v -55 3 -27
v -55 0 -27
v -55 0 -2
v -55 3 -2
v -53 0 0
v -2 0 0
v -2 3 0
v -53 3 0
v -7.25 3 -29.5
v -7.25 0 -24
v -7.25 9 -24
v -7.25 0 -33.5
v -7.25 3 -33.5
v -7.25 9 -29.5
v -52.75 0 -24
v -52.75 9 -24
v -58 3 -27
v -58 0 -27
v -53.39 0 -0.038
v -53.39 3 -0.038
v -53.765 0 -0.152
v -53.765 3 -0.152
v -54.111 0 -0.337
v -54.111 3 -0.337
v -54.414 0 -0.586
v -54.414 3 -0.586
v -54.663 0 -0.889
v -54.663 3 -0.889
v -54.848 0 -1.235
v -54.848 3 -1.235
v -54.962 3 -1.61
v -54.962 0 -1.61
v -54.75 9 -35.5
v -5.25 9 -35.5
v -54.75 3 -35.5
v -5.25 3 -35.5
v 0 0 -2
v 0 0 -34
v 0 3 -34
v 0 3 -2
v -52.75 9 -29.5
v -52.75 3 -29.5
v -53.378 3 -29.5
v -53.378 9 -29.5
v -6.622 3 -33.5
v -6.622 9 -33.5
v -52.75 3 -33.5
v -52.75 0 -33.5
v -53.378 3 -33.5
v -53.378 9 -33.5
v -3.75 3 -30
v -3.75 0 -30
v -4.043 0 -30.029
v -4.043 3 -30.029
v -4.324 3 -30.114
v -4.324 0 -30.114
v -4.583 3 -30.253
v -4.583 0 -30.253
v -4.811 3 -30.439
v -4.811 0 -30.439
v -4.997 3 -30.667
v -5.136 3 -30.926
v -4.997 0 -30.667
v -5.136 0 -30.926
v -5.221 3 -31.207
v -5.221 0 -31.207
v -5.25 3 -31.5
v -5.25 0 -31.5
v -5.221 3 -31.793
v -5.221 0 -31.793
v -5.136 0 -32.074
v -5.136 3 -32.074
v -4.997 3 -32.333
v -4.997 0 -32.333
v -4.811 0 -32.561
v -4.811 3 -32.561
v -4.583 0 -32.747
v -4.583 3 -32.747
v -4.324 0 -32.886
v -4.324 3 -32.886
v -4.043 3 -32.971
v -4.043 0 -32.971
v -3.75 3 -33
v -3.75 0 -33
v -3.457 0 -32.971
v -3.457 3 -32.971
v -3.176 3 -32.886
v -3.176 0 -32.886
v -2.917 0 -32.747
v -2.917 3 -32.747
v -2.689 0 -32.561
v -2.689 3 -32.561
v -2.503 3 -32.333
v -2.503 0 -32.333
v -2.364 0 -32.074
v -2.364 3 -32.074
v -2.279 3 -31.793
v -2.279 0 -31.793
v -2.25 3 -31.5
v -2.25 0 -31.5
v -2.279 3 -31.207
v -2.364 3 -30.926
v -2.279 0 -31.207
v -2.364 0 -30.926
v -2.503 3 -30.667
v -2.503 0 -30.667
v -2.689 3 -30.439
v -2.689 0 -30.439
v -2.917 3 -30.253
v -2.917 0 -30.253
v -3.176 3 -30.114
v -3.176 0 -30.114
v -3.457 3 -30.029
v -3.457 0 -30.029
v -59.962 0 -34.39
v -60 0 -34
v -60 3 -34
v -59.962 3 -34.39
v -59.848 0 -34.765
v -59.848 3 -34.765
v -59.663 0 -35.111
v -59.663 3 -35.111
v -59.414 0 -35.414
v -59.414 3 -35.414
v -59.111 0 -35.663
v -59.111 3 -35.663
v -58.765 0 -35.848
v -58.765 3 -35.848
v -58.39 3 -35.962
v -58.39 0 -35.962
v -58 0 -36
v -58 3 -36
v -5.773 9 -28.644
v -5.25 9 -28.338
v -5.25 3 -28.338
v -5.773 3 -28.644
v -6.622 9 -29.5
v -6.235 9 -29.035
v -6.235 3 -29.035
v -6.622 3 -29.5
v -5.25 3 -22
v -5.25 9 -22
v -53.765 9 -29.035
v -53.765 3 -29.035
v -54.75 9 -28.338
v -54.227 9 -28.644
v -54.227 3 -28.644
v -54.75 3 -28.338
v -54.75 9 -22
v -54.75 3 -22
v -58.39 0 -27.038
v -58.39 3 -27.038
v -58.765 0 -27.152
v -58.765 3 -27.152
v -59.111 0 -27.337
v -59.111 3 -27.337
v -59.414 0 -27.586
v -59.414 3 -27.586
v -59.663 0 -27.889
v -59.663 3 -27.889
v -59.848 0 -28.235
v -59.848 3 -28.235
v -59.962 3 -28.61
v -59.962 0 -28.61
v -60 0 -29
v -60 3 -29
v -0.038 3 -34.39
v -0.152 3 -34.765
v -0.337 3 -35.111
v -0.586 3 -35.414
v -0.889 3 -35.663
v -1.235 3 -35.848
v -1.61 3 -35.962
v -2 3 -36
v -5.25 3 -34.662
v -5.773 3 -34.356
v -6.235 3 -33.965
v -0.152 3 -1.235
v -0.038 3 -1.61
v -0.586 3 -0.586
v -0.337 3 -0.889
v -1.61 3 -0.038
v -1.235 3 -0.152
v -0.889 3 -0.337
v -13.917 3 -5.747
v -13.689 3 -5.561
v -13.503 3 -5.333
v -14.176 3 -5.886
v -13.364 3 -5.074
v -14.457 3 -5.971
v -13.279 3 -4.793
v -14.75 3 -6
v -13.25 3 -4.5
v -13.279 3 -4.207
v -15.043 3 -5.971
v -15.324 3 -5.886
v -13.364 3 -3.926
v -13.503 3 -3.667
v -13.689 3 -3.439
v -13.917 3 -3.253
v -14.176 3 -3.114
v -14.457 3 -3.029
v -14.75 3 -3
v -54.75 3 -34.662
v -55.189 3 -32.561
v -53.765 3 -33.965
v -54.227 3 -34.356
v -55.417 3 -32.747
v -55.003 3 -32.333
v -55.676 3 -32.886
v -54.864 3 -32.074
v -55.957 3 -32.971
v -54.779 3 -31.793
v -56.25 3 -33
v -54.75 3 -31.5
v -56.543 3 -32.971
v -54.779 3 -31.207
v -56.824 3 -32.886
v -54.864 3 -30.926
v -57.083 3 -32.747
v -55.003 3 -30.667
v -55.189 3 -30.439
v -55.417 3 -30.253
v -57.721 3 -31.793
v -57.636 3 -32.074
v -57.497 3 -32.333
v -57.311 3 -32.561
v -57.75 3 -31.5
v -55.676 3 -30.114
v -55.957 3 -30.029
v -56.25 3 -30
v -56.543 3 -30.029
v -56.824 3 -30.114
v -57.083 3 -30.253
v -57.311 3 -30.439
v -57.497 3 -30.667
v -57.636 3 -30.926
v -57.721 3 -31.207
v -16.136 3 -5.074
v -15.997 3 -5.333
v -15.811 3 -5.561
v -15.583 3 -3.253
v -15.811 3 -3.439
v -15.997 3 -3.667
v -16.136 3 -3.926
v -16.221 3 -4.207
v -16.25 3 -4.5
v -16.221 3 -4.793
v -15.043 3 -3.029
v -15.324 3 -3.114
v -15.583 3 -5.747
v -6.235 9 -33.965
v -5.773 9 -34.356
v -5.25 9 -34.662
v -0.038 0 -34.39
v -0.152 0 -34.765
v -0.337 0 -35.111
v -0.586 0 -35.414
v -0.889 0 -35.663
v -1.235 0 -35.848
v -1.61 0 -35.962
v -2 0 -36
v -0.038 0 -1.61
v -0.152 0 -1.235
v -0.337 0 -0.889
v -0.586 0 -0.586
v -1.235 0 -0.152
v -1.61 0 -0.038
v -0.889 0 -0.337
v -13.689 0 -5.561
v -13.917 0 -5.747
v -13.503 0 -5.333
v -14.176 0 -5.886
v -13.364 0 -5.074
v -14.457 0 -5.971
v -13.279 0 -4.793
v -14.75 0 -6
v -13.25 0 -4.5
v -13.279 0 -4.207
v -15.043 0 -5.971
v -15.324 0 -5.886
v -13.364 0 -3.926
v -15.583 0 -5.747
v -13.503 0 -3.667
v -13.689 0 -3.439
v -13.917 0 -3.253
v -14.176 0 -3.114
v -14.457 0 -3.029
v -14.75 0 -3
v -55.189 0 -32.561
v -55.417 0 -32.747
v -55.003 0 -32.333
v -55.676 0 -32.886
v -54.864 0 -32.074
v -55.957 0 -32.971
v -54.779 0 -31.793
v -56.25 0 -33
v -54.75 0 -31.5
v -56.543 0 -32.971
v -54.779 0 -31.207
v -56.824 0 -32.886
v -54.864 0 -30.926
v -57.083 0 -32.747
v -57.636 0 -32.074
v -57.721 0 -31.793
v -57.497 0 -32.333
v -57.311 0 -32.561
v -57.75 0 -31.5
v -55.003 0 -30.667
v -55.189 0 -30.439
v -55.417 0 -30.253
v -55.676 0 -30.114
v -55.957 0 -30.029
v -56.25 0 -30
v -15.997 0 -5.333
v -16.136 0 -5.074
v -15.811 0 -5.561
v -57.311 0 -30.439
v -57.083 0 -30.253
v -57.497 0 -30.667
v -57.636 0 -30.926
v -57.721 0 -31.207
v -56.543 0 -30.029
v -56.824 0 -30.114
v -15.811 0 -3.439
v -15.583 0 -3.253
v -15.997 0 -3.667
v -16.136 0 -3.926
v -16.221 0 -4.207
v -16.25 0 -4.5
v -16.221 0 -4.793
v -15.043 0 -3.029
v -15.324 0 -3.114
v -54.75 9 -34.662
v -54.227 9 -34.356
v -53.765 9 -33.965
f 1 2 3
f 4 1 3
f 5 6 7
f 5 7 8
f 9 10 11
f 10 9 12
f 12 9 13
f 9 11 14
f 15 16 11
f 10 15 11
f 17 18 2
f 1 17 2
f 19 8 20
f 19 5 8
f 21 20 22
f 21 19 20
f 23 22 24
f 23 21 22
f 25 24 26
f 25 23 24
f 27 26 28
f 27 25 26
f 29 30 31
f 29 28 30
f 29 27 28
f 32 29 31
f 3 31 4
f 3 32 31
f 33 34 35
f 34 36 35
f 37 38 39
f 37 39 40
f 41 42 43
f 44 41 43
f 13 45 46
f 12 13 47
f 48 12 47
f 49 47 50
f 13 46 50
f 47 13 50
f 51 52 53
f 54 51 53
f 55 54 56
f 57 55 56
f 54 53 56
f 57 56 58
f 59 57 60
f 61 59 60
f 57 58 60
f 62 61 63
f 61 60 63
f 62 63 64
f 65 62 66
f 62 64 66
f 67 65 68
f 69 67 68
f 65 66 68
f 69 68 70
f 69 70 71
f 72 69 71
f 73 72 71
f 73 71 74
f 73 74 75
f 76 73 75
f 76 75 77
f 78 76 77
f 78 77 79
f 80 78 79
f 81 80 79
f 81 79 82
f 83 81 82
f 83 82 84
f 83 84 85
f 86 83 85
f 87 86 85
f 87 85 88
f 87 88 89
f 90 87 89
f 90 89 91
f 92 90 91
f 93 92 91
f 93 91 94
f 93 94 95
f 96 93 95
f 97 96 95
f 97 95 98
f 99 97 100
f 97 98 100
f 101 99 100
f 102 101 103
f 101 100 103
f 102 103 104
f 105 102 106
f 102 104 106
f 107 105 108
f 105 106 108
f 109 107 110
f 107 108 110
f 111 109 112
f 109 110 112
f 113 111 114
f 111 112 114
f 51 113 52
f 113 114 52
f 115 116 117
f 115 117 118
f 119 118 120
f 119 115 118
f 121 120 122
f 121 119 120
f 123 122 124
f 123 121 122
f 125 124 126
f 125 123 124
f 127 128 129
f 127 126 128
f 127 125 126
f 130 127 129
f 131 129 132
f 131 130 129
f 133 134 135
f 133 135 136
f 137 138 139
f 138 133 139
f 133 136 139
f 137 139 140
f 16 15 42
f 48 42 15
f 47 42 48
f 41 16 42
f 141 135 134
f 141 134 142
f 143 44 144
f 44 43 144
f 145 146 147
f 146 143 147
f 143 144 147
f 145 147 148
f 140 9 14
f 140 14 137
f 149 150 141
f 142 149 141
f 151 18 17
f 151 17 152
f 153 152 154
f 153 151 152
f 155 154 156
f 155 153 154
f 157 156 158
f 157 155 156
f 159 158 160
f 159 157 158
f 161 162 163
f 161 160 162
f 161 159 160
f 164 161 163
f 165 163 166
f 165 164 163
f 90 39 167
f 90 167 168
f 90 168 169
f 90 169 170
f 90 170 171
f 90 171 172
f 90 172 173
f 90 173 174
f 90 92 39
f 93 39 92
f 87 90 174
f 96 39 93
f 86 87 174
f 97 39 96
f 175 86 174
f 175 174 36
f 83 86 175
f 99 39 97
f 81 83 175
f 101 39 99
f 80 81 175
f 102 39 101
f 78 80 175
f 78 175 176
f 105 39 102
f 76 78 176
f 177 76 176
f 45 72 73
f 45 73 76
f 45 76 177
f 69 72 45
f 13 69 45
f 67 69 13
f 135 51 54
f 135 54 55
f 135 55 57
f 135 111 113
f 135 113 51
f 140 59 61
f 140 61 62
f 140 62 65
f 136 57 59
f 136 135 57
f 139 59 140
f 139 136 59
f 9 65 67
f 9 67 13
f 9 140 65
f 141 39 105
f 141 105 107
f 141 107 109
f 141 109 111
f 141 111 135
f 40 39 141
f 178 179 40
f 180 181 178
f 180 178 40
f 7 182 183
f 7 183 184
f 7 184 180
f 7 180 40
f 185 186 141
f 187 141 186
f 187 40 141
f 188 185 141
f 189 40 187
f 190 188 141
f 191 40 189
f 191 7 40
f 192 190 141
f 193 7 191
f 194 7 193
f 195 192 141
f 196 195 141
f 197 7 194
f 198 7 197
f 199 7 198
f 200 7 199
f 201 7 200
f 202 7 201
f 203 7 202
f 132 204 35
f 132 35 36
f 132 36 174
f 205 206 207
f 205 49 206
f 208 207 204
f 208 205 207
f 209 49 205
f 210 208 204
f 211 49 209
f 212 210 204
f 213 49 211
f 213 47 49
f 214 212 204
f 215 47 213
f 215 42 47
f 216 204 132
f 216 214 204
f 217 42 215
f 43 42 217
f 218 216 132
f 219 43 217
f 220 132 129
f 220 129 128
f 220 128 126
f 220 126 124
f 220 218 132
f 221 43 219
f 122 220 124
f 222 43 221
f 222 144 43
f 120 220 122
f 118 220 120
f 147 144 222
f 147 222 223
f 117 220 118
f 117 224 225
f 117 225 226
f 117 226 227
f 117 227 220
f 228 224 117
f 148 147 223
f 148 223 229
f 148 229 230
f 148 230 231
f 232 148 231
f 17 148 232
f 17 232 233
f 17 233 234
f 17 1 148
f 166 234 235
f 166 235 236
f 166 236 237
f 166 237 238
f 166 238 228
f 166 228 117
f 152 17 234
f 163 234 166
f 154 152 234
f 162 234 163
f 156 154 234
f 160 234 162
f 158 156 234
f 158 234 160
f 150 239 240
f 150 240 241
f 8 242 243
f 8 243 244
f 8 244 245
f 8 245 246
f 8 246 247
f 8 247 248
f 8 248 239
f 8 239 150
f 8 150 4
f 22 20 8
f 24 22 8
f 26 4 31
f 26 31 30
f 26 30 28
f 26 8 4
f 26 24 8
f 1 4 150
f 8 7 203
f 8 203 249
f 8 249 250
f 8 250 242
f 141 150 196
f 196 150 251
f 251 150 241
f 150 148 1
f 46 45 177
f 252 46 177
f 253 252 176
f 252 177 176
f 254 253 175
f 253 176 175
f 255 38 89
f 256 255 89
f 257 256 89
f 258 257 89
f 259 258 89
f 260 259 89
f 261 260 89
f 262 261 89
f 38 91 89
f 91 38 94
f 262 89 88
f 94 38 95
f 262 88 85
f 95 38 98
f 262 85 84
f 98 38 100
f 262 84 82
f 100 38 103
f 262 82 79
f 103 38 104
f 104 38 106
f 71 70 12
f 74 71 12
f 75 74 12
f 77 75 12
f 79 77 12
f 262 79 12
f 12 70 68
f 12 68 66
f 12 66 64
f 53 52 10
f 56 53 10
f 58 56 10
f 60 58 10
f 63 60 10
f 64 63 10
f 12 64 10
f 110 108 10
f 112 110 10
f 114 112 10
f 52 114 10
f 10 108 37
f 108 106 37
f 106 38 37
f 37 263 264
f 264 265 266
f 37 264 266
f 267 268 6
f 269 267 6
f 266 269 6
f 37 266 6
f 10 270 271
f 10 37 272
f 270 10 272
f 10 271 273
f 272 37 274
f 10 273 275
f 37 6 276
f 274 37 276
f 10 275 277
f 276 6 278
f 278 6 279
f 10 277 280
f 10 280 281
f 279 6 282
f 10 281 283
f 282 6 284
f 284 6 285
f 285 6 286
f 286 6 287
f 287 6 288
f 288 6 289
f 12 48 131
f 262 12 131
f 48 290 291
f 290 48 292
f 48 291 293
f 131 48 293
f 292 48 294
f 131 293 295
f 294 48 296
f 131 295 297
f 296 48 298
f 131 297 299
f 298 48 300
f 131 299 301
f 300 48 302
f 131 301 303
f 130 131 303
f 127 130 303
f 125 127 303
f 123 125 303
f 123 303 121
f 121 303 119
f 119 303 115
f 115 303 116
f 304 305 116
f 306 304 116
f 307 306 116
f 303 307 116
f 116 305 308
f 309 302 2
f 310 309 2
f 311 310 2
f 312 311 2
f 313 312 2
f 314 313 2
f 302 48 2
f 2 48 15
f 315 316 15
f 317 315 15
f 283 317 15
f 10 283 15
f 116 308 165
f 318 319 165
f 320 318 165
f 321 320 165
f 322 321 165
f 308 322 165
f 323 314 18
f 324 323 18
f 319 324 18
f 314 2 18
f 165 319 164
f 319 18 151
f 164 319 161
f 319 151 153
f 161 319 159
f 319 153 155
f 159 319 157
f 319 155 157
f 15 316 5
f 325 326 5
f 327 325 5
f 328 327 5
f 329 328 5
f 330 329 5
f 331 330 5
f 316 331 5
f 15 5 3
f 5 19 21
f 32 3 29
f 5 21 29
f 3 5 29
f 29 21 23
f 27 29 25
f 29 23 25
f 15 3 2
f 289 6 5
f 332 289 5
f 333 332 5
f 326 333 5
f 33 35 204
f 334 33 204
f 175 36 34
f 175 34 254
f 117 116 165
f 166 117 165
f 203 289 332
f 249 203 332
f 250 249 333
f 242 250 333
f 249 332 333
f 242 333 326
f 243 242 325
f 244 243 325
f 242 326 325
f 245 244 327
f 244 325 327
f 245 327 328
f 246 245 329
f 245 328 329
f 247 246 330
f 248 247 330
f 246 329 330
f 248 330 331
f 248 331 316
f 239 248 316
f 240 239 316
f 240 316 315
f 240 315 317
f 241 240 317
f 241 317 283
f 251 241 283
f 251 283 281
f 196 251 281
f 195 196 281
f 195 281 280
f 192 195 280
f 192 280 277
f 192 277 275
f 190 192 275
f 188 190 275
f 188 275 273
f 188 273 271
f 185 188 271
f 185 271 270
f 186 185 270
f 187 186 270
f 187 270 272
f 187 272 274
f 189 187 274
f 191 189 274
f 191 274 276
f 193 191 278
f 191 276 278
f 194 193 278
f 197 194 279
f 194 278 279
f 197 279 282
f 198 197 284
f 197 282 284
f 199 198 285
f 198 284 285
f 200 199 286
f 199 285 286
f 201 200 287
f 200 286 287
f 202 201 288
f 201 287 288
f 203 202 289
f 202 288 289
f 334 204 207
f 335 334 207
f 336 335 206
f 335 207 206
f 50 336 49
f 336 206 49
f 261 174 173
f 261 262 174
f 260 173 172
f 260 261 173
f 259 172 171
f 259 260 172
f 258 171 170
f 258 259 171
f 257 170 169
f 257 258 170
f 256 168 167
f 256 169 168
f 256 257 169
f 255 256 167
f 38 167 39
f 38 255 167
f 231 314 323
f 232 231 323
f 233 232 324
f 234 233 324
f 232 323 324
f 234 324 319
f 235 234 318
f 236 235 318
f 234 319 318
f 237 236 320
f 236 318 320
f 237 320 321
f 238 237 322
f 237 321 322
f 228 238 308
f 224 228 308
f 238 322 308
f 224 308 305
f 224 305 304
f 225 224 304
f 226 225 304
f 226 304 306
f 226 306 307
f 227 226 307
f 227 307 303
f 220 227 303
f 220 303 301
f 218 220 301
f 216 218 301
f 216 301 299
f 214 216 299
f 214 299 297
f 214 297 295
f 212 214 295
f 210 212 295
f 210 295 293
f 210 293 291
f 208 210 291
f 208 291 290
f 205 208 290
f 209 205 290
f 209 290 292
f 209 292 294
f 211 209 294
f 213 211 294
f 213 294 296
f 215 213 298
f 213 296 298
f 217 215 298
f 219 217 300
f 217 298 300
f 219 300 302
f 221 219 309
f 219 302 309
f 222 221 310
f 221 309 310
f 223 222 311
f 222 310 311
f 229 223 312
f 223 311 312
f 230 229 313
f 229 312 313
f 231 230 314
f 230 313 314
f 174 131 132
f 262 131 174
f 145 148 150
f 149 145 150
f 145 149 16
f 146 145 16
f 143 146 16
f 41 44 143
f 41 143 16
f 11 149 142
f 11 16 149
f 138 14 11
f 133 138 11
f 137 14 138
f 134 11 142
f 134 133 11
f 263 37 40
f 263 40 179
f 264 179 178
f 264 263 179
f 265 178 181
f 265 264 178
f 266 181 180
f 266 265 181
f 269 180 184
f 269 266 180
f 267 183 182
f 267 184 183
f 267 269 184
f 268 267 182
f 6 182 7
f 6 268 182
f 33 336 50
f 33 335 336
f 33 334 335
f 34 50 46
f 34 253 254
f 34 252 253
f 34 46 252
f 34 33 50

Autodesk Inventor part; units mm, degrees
ref_plane "YZ Plane" through (0, 0, 0) normal (1, 0, 0) x (0, 1, 0)
ref_plane "XZ Plane" through (0, 0, 0) normal (0, 1, 0) x (-1, 0, 0)
ref_plane "XY Plane" through (0, 0, 0) normal (0, 0, 1) x (1, 0, 0)
sketch "Sketch1" plane through (0, 0, 0) normal (0, 1, 0) x (-1, 0, 0)
  line L0 (2, 0) -> (53, 0)
  line L1 (58, -36) -> (2, -36)
  line L2 (0, -34) -> (0, -2)
  line L3 (60, -34) -> (60, -29)
  line L4 (58, -27) -> (55, -27)
  line L5 (55, -27) -> (55, -2)
  arc A0 (58, -36) -> (60, -34) centre (58, -34) ccw
  arc A1 (0, -34) -> (2, -36) centre (2, -34) ccw
  arc A2 (55, -2) -> (53, 0) centre (53, -2) ccw
  arc A3 (2, 0) -> (0, -2) centre (2, -2) ccw
  arc A4 (60, -29) -> (58, -27) centre (58, -29) ccw
  point P0 (0, 0)
  point P1 (60, -36)
  point P2 (55, 0)
  point P3 (0, -36)
  point P4 (60, -27)
  dimension "d0" = 60
  dimension "d47" = 36
  dimension "d48" = 9
  dimension "d49" = 5
  dimension "d68" = 2
  dimension "d87" = 2
extrude "Extrusion1" add sketch "Sketch1" along normal blind 3
sketch "Sketch7" plane through (0, 3, 0) normal (0, 1, 0) x (1, 0, 0)
  line L0 (-53, 0) -> (-2, 0) projected
  line L1 (0, 2) -> (0, 34) projected
  line L2 (-2, 36) -> (-58, 36) projected
  line L3 (-56.25, 31.5) -> (-3.75, 31.5)
  line L4 (-3.75, 31.5) -> (-3.75, 4.5)
  line L5 (-3.75, 4.5) -> (-56.25, 4.5)
  line L6 (-56.25, 4.5) -> (-56.25, 31.5)
  line L7 (-55, 27) -> (-55, 2) projected
  line L8 (-60, 34) -> (-60, 29) projected
  line L9 (-58, 27) -> (-55, 27) projected
  arc A0 (-55, 2) -> (-53, 0) centre (-53, 2) ccw projected
  arc A1 (-2, 0) -> (0, 2) centre (-2, 2) ccw projected
  arc A2 (0, 34) -> (-2, 36) centre (-2, 34) ccw projected
  arc A3 (-58, 36) -> (-60, 34) centre (-58, 34) ccw projected
  arc A4 (-60, 29) -> (-58, 27) centre (-58, 29) ccw projected
  point P0 (-14.75, 4.5)
  dimension "d42" = 27
  dimension "d43" = 52.5
  dimension "d44" = 4.5
  dimension "d45" = 11
  dimension "d50" = 3.75
hole "Hole1" at (-56.25, 3, -31.5) at (-3.75, 3, -31.5) at (-14.75, 3, -4.5) direction (0, -1, 0) diameter 3 depth 10.25
sketch "Sketch8" plane through (0, 3, 0) normal (0, 1, 0) x (1, 0, 0)
  line L0 (-52.75, 33.5) -> (-7.25, 33.5)
  line L1 (-7.25, 24) -> (-52.75, 24)
  circle A0 centre (-56.25, 31.5) radius 1.5 projected
  circle A1 centre (-3.75, 31.5) radius 1.5 projected
  circle A2 centre (-56.25, 31.5) radius 3.5
  circle A3 centre (-3.75, 31.5) radius 3.5
  line L2 (-2, 36) -> (-58, 36) projected
  line L3 (-54.75, 28.3377) -> (-54.75, 22)
  line L4 (-54.75, 22) -> (-5.25, 22)
  line L5 (-5.25, 35.5) -> (-54.75, 35.5)
  line L6 (-54.75, 35.5) -> (-54.75, 34.6623)
  line L7 (-52.75, 33.5) -> (-53.3777, 33.5)
  line L8 (-52.75, 24) -> (-52.75, 29.5)
  line L9 (-52.75, 29.5) -> (-52.75, 31.5)
  line L10 (-52.75, 33.5) -> (-52.75, 31.5)
  line L11 (-52.75, 29.5) -> (-53.3777, 29.5)
  line L12 (-7.25, 33.5) -> (-7.25, 31.5)
  line L13 (-7.25, 31.5) -> (-7.25, 29.5)
  line L14 (-7.25, 29.5) -> (-7.25, 24)
  line L15 (-7.25, 33.5) -> (-6.6223, 33.5)
  line L16 (-7.25, 29.5) -> (-6.6223, 29.5)
  line L17 (-5.25, 35.5) -> (-5.25, 34.6623)
  line L18 (-5.25, 28.3377) -> (-5.25, 22)
  point P0 (0, 0)
  dimension "d73" = 9.5
  dimension "d74" = 45.5
  dimension "d75" = 7
  dimension "d76" = 7
  dimension "d77" = 2.5
  dimension "d78" = 2
  dimension "d81" = 2
  dimension "d82" = 9.5
  dimension "d83" = 2
  dimension "d85" = 49.5
  dimension "d86" = 49.5
extrude "Extrusion6" add sketch "Sketch8" along normal blind 6 contours L7 A2 L6 L5 L17 A3 L15 L0 | L11 L8 L1 L14 L16 A3 L18 L4 L3 A2
sketch "Sketch9" plane through (0, 3, 0) normal (0, 1, 0) x (1, 0, 0)
  line L0 (-52.75, 29.5) -> (-52.75, 24) projected
  line L1 (-52.75, 24) -> (-7.25, 24) projected
  line L2 (-7.25, 24) -> (-7.25, 29.5) projected
  line L3 (-6.6223, 33.5) -> (-53.3777, 33.5) projected
  line L4 (-52.75, 29.5) -> (-52.75, 33.5)
  line L5 (-7.25, 29.5) -> (-6.6223, 29.5) projected
  line L6 (-7.25, 29.5) -> (-7.25, 33.5)
  point P0 (0, 0)
extrude "Extrusion7" cut sketch "Sketch9" against normal up to next
properties part number "MidPlate v2"
